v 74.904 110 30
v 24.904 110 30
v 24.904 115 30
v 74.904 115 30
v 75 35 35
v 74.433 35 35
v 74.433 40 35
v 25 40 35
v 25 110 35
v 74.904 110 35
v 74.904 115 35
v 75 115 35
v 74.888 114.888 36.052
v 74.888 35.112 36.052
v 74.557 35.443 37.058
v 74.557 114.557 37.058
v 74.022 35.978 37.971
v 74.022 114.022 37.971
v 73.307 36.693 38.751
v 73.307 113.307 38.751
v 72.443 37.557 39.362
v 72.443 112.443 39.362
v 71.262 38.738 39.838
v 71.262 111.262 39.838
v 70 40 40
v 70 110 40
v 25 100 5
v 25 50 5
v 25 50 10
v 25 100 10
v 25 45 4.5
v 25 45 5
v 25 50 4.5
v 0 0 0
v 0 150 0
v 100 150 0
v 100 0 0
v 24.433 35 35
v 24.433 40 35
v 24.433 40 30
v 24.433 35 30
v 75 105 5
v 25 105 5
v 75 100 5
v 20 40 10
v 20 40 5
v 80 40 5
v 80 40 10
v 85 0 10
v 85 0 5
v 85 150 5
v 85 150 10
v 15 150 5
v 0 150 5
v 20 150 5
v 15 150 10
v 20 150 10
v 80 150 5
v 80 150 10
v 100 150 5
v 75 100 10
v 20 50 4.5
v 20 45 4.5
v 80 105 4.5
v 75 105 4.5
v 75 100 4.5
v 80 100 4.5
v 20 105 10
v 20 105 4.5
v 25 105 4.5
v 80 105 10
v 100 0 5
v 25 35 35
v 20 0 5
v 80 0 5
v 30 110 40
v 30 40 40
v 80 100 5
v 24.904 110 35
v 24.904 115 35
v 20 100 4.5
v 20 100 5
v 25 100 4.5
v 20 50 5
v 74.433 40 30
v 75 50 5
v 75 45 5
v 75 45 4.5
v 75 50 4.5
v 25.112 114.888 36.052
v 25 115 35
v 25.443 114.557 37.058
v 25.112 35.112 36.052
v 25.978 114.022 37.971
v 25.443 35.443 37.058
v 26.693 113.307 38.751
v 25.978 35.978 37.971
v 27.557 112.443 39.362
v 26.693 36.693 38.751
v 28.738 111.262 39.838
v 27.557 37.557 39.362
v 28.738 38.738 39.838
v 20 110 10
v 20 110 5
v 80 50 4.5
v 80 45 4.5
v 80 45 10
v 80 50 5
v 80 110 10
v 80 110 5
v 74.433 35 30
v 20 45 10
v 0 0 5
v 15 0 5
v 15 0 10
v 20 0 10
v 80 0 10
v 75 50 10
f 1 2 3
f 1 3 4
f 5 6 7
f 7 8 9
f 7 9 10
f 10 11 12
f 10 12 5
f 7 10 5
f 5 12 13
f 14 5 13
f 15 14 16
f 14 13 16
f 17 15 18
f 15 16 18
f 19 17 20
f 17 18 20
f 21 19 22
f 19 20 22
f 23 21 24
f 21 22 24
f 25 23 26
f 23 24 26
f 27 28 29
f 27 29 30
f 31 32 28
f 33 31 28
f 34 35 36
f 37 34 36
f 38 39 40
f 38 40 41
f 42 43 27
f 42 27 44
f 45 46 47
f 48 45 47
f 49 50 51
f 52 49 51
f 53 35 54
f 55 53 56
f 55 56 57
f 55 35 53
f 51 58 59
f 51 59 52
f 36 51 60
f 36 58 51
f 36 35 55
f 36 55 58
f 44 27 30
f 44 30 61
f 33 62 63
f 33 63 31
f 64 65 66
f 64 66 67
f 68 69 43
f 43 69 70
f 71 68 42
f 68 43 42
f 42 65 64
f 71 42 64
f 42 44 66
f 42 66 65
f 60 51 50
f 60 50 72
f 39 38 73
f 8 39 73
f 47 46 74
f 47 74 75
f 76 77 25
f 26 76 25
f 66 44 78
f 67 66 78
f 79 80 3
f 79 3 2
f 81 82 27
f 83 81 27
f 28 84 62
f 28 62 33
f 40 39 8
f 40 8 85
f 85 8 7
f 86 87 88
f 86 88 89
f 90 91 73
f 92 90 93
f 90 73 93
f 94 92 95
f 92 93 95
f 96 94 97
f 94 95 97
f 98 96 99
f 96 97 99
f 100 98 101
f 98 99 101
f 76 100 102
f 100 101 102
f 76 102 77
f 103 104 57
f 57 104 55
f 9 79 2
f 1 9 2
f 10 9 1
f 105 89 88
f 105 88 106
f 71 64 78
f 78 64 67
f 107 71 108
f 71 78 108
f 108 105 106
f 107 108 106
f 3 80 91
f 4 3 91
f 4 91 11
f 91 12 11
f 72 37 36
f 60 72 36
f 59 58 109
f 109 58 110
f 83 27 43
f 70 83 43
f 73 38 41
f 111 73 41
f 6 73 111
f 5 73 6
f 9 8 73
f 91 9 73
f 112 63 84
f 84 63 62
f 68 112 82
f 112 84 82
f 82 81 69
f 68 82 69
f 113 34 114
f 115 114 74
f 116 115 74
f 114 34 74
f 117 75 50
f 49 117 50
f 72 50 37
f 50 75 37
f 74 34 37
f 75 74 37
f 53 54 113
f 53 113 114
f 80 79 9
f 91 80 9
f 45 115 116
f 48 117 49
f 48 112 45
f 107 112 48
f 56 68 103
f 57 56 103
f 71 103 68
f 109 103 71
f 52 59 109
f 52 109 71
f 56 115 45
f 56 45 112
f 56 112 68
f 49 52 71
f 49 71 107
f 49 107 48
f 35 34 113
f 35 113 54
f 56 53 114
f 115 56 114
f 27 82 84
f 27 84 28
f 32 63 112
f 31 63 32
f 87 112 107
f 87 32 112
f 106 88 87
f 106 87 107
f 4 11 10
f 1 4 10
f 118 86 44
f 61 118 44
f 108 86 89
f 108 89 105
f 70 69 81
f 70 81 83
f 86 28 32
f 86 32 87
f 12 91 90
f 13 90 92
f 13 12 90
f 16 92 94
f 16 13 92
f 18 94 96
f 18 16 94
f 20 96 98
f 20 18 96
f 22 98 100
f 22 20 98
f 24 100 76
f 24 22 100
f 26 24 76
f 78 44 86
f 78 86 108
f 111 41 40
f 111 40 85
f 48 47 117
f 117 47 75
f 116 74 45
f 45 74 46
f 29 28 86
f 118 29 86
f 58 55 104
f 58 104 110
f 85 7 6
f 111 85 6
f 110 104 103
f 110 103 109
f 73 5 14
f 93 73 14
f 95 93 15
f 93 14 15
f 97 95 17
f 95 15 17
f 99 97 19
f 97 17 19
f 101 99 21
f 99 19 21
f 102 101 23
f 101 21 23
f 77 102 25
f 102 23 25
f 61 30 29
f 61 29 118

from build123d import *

# Parameters (mm, degrees)
F0_W      = 100
F0_H      = 150
F1_DEPTH  = 5
F3_W      = 60
F3_H      = 5
F4_DEPTH  = 5
F5_W      = 5
F5_H      = 5
F6_DEPTH  = 0.5
F7_W      = 50
F7_H      = 50
F8_DEPTH  = 5
F10_W     = 50
F10_H     = 5
F10_H_2   = 70
F11_DEPTH = 5
F13_W     = 50
F13_H     = 5
F14_DEPTH = 5
F15_R     = 4.99999


# Not quite as in the source:
# - a fillet or chamfer is up to 0.001 mm smaller than in the source, because OpenCascade refuses the exact size


with BuildPart() as f1:
    # F0 (on Top) → F1 (new body)
    with BuildSketch(Plane.XY):
        with Locations((50, 75)):
            Rectangle(F0_W, F0_H)
    extrude(amount=F1_DEPTH)

    # F3 (on offset) → F4 (join)
    with BuildSketch(Plane.XY.offset(5)):
        Polygon((20, 150), (15, 150), (15, 0), (20, 0), (20, 40), (20, 45), (20, 105), (20, 110), align=None)
        with Locations((50, 107.5)):
            Rectangle(F3_W, F3_H)
        Polygon((80, 150), (80, 110), (80, 105), (80, 45), (80, 40), (80, 0), (85, 0), (85, 150), align=None)
        with Locations((50, 42.5)):
            Rectangle(F3_W, F3_H)
    extrude(amount=F4_DEPTH)

    # F5 (on offset) → F6 (cut)
    with BuildSketch(Plane.XY.offset(5)):
        with Locations((22.5, 102.5)):
            Rectangle(F5_W, F5_H)
        with Locations((77.5, 102.5)):
            Rectangle(F5_W, F5_H)
        with Locations((77.5, 47.5)):
            Rectangle(F5_W, F5_H)
        with Locations((22.5, 47.5)):
            Rectangle(F5_W, F5_H)
    extrude(amount=-F6_DEPTH, mode=Mode.SUBTRACT)

    # F7 (on offset) → F8 (join)
    with BuildSketch(Plane.XY.offset(5)):
        with Locations((50, 75)):
            Rectangle(F7_W, F7_H)
    extrude(amount=F8_DEPTH)


with BuildPart() as f11:
    # F10 (on offset) → F11 (new body)
    with BuildSketch(Plane.XY.offset(35)):
        with Locations((50, 112.5)):
            Rectangle(F10_W, F10_H)
        with Locations((50, 75)):
            Rectangle(F10_W, F10_H_2)
        with Locations((50, 37.5)):
            Rectangle(F10_W, F10_H)
    extrude(amount=F11_DEPTH)

    # F13 (on offset) → F14 (join)
    with BuildSketch(Plane(origin=(0, 0, 35), x_dir=(1, 0, 0), z_dir=(0, 0, -1))):
        with Locations((49.4327385849, -37.5)):
            Rectangle(F13_W, F13_H)
        with Locations((49.9044367713, -112.5)):
            Rectangle(F13_W, F13_H)
    extrude(amount=F14_DEPTH)

    # F15 (radius 5 in the source; OpenCascade refuses exactly that, so slightly less here)
    f15_edges = [f11.edges().sort_by_distance(p)[0] for p in [
        (50, 115, 40),
        (25, 75, 40),
        (50, 35, 40),
        (75, 75, 40),
    ]]
    fillet(f15_edges, radius=F15_R)


solid = Compound([f1.part, f11.part])
